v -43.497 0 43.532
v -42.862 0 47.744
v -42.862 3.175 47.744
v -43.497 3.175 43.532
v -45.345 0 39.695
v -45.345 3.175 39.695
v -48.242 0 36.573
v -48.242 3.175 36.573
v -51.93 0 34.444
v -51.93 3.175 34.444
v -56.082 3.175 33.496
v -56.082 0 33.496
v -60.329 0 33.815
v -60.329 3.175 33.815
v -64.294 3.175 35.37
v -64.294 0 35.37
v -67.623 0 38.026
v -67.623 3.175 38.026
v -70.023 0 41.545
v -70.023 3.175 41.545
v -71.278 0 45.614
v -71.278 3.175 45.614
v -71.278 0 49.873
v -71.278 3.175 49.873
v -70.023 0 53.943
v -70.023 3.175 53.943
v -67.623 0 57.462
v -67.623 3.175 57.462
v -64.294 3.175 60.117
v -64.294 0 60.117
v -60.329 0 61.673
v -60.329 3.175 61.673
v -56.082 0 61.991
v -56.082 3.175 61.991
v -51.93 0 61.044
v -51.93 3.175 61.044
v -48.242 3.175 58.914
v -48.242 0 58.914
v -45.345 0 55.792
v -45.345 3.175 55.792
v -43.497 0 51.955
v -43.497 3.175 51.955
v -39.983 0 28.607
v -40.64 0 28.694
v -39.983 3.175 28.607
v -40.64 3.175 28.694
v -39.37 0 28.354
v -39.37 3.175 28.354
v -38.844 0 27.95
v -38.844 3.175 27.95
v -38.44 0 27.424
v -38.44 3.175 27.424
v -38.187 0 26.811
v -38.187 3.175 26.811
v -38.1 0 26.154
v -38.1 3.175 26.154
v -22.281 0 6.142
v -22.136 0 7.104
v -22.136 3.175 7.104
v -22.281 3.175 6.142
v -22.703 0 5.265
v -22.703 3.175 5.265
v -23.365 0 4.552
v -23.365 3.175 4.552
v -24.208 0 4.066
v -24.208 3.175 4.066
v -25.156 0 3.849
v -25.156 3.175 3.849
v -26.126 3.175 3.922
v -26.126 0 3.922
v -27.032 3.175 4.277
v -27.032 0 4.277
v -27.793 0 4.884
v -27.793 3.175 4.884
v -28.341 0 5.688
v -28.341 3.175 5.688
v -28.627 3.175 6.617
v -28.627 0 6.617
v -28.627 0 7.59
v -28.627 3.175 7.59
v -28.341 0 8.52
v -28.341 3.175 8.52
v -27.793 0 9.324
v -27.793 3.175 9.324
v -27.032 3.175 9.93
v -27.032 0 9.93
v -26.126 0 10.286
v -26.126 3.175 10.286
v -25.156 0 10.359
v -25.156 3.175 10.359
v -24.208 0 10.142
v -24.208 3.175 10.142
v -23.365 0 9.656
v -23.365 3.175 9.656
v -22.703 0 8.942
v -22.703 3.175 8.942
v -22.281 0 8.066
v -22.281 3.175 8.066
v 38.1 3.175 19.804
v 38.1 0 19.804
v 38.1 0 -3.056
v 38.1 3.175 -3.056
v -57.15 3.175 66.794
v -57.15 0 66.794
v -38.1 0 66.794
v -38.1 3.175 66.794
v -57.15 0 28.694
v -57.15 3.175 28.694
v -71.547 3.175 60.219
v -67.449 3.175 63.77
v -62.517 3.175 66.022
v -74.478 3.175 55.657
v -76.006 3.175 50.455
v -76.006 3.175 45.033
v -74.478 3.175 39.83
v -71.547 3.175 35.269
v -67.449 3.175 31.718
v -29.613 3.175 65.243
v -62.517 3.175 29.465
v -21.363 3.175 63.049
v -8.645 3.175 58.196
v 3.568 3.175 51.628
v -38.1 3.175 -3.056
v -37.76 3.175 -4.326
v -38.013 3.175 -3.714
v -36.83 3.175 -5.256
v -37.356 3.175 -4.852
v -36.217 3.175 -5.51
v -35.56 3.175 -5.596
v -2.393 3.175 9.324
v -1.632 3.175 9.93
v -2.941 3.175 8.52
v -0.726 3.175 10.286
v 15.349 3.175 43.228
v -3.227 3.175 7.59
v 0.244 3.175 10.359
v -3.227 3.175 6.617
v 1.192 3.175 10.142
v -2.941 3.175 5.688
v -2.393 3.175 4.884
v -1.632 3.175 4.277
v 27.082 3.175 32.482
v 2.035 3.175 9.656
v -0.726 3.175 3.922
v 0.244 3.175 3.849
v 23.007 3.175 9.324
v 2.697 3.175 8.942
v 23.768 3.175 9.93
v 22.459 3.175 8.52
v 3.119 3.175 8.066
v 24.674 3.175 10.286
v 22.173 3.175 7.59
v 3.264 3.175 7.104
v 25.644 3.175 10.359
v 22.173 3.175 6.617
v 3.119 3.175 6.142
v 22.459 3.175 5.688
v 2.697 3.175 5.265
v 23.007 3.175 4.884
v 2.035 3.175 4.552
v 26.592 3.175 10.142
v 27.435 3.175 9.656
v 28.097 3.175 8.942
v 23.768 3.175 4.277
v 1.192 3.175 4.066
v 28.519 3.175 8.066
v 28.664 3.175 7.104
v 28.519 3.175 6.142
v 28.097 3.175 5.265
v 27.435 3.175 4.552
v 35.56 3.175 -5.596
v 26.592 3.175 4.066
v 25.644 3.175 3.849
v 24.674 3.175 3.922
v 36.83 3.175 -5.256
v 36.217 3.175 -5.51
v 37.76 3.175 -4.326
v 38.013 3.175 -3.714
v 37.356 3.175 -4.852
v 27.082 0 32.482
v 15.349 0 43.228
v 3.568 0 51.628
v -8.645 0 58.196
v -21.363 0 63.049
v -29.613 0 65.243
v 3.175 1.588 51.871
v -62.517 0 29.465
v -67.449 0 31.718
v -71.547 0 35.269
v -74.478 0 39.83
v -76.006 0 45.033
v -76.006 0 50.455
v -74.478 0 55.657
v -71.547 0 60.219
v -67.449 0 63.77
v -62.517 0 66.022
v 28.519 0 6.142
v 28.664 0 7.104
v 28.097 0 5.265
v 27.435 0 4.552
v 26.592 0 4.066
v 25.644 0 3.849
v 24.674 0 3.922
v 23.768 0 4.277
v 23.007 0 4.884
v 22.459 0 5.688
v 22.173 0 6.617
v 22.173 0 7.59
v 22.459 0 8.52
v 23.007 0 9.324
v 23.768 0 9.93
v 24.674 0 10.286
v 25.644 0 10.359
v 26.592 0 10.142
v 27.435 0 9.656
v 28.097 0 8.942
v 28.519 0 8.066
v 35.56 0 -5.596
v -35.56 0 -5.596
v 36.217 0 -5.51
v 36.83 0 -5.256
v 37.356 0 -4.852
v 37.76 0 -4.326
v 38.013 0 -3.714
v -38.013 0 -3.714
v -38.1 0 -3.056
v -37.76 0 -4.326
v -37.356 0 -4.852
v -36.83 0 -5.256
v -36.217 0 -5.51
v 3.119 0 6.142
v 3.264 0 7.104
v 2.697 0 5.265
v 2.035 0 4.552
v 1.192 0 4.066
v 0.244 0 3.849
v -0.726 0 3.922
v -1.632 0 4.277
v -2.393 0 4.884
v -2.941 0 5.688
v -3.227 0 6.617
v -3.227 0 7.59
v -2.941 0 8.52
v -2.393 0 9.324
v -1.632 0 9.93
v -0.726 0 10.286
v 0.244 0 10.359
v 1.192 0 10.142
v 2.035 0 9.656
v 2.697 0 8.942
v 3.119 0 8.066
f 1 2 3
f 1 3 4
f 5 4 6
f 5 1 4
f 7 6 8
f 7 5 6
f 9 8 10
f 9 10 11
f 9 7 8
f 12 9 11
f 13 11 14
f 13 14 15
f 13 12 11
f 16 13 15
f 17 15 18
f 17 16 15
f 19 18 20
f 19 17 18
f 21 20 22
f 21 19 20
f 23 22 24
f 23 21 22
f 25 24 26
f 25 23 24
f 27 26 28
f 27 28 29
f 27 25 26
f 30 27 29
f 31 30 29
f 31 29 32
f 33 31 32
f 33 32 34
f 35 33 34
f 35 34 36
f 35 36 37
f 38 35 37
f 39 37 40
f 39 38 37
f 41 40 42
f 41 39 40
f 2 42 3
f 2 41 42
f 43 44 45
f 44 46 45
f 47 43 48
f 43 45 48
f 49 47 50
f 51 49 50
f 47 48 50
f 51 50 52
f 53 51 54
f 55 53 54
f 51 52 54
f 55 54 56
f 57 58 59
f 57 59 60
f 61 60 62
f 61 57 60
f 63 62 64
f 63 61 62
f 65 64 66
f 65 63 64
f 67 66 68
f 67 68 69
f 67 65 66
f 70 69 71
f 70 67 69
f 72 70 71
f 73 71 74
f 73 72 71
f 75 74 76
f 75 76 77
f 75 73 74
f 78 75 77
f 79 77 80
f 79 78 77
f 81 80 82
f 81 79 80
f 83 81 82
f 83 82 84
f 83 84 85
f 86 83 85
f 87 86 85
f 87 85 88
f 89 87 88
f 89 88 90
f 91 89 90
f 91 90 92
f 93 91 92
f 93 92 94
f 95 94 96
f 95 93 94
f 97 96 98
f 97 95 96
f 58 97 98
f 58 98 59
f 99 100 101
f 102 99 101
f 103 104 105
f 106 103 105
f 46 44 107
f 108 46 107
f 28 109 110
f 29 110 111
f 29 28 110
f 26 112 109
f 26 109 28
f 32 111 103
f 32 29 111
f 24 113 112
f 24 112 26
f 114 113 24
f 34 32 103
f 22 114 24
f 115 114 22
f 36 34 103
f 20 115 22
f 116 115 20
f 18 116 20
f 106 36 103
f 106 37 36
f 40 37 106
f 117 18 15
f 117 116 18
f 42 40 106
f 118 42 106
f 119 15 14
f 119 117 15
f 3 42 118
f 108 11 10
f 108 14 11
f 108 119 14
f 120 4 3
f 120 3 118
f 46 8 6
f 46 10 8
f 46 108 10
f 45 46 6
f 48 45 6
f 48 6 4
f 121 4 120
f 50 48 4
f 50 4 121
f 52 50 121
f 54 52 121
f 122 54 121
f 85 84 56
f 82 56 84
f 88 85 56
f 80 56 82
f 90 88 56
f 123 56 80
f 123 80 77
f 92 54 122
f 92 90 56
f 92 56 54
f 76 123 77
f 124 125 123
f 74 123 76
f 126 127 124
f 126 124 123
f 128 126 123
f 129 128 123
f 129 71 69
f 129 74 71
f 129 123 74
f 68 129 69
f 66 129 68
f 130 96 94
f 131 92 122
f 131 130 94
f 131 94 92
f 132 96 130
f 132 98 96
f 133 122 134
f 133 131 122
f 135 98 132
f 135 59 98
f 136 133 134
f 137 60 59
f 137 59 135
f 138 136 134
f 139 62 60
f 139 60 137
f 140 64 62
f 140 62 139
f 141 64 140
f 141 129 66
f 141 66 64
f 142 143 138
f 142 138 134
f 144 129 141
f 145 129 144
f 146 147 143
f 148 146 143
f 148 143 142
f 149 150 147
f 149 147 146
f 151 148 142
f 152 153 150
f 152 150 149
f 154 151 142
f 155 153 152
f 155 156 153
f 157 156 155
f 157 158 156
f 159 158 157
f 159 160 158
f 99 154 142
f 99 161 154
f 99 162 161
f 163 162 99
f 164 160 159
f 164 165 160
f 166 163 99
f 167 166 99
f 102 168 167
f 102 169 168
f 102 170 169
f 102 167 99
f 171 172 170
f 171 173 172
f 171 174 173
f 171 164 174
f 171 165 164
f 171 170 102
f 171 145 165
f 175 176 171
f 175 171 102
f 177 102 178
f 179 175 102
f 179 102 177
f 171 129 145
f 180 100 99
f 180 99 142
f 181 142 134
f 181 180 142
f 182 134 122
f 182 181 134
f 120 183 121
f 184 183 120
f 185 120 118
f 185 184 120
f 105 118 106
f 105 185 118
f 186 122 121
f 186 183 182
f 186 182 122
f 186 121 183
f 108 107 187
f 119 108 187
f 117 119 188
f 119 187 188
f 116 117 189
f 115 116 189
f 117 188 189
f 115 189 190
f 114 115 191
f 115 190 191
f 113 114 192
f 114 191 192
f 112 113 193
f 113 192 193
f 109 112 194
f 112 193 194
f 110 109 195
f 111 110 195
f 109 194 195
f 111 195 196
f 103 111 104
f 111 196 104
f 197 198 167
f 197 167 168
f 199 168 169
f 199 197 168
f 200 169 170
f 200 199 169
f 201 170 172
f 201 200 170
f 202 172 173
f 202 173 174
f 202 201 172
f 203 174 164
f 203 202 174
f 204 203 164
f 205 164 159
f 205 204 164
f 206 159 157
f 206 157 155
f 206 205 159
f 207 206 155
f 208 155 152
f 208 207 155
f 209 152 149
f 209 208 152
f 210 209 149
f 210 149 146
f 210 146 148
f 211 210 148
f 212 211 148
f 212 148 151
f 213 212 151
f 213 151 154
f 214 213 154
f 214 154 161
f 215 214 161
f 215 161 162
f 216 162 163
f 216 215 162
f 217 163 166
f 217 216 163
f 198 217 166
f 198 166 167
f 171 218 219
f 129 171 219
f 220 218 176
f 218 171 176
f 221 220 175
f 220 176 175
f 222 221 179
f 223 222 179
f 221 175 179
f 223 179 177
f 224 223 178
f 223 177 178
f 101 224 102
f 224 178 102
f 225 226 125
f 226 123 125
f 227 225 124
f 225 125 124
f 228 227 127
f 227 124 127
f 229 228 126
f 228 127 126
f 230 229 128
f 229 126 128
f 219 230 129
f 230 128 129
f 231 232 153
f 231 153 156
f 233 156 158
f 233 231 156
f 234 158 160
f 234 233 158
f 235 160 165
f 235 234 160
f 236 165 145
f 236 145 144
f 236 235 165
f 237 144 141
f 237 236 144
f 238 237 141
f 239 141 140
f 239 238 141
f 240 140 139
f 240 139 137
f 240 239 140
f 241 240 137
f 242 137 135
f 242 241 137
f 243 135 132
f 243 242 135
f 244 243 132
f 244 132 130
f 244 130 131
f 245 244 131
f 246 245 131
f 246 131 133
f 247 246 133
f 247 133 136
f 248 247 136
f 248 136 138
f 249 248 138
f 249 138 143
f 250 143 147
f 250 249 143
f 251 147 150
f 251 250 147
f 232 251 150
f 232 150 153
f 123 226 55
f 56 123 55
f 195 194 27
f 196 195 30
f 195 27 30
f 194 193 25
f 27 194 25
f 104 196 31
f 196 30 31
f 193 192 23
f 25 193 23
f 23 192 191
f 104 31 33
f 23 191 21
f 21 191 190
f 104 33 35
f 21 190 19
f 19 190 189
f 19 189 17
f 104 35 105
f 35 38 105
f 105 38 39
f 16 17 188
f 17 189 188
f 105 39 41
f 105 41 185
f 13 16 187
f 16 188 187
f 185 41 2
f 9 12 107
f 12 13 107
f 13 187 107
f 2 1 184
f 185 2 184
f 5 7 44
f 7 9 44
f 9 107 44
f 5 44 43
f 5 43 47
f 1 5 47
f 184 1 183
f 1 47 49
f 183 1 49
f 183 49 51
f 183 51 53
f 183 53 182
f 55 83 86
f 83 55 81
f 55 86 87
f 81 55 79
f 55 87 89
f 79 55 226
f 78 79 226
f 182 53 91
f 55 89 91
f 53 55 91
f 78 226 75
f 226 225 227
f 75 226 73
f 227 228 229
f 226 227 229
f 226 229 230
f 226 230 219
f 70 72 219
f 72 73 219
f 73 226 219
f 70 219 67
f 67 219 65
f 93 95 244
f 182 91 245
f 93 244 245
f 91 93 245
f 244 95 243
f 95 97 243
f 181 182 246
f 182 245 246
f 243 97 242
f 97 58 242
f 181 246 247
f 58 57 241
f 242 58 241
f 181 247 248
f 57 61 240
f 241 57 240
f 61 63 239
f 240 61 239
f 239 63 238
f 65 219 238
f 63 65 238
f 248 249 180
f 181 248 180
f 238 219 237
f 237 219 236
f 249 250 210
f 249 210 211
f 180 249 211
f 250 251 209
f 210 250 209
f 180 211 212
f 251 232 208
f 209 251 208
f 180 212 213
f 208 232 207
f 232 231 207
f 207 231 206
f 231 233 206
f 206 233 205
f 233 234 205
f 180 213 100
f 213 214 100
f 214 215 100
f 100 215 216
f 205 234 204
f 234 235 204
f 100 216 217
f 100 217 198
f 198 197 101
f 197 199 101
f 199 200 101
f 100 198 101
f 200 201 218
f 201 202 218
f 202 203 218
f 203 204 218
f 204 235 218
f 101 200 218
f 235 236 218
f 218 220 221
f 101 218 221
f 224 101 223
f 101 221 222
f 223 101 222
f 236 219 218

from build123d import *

# Parameters (mm, degrees)
SKETCH1_R           = 14.2875
SKETCH1_R_2         = 3.2639
BOSS_EXTRUDE1_DEPTH = 3.175
FILLET1_R           = 2.54


with BuildPart() as part:
    # Sketch1 → Boss-Extrude1 (new body)
    with BuildSketch(Plane(origin=(0, 0, 0), x_dir=(1, 0, 0), z_dir=(0, 1, 0))):
        with BuildLine():
            Line((-38.1, -28.693802537), (-57.15, -28.693802537))
            ThreePointArc((-57.15, -28.693802537), (-76.2, -47.743802537), (-57.15, -66.793802537))
            Line((-57.15, -66.793802537), (-38.1, -66.793802537))
            add(Edge.make_bspline(
                [(38.1, -19.803802537), (6.35, -60.443802537), (-38.1, -66.793802537)],
                knots=[0, 0, 0, 1, 1, 1], degree=2))
            Line((38.1, -19.803802537), (38.1, 5.596197463))
            Line((38.1, 5.596197463), (-38.1, 5.596197463))
            Line((-38.1, 5.596197463), (-38.1, -28.693802537))
        make_face()
        with Locations((-57.15, -47.743802537)):
            Circle(SKETCH1_R, mode=Mode.SUBTRACT)
        with Locations((-25.4, -7.103802537)):
            Circle(SKETCH1_R_2, mode=Mode.SUBTRACT)
        with Locations((0, -7.103802537)):
            Circle(SKETCH1_R_2, mode=Mode.SUBTRACT)
        with Locations((25.4, -7.103802537)):
            Circle(SKETCH1_R_2, mode=Mode.SUBTRACT)
    extrude(amount=BOSS_EXTRUDE1_DEPTH)

    # Fillet1
    fillet1_edges = [part.edges().sort_by_distance(p)[0] for p in [
        (-38.1, 1.5875, 28.693802537),
        (-38.1, 1.5875, -5.596197463),
        (38.1, 1.5875, -5.596197463),
    ]]
    fillet(fillet1_edges, radius=FILLET1_R)


solid = part.part
